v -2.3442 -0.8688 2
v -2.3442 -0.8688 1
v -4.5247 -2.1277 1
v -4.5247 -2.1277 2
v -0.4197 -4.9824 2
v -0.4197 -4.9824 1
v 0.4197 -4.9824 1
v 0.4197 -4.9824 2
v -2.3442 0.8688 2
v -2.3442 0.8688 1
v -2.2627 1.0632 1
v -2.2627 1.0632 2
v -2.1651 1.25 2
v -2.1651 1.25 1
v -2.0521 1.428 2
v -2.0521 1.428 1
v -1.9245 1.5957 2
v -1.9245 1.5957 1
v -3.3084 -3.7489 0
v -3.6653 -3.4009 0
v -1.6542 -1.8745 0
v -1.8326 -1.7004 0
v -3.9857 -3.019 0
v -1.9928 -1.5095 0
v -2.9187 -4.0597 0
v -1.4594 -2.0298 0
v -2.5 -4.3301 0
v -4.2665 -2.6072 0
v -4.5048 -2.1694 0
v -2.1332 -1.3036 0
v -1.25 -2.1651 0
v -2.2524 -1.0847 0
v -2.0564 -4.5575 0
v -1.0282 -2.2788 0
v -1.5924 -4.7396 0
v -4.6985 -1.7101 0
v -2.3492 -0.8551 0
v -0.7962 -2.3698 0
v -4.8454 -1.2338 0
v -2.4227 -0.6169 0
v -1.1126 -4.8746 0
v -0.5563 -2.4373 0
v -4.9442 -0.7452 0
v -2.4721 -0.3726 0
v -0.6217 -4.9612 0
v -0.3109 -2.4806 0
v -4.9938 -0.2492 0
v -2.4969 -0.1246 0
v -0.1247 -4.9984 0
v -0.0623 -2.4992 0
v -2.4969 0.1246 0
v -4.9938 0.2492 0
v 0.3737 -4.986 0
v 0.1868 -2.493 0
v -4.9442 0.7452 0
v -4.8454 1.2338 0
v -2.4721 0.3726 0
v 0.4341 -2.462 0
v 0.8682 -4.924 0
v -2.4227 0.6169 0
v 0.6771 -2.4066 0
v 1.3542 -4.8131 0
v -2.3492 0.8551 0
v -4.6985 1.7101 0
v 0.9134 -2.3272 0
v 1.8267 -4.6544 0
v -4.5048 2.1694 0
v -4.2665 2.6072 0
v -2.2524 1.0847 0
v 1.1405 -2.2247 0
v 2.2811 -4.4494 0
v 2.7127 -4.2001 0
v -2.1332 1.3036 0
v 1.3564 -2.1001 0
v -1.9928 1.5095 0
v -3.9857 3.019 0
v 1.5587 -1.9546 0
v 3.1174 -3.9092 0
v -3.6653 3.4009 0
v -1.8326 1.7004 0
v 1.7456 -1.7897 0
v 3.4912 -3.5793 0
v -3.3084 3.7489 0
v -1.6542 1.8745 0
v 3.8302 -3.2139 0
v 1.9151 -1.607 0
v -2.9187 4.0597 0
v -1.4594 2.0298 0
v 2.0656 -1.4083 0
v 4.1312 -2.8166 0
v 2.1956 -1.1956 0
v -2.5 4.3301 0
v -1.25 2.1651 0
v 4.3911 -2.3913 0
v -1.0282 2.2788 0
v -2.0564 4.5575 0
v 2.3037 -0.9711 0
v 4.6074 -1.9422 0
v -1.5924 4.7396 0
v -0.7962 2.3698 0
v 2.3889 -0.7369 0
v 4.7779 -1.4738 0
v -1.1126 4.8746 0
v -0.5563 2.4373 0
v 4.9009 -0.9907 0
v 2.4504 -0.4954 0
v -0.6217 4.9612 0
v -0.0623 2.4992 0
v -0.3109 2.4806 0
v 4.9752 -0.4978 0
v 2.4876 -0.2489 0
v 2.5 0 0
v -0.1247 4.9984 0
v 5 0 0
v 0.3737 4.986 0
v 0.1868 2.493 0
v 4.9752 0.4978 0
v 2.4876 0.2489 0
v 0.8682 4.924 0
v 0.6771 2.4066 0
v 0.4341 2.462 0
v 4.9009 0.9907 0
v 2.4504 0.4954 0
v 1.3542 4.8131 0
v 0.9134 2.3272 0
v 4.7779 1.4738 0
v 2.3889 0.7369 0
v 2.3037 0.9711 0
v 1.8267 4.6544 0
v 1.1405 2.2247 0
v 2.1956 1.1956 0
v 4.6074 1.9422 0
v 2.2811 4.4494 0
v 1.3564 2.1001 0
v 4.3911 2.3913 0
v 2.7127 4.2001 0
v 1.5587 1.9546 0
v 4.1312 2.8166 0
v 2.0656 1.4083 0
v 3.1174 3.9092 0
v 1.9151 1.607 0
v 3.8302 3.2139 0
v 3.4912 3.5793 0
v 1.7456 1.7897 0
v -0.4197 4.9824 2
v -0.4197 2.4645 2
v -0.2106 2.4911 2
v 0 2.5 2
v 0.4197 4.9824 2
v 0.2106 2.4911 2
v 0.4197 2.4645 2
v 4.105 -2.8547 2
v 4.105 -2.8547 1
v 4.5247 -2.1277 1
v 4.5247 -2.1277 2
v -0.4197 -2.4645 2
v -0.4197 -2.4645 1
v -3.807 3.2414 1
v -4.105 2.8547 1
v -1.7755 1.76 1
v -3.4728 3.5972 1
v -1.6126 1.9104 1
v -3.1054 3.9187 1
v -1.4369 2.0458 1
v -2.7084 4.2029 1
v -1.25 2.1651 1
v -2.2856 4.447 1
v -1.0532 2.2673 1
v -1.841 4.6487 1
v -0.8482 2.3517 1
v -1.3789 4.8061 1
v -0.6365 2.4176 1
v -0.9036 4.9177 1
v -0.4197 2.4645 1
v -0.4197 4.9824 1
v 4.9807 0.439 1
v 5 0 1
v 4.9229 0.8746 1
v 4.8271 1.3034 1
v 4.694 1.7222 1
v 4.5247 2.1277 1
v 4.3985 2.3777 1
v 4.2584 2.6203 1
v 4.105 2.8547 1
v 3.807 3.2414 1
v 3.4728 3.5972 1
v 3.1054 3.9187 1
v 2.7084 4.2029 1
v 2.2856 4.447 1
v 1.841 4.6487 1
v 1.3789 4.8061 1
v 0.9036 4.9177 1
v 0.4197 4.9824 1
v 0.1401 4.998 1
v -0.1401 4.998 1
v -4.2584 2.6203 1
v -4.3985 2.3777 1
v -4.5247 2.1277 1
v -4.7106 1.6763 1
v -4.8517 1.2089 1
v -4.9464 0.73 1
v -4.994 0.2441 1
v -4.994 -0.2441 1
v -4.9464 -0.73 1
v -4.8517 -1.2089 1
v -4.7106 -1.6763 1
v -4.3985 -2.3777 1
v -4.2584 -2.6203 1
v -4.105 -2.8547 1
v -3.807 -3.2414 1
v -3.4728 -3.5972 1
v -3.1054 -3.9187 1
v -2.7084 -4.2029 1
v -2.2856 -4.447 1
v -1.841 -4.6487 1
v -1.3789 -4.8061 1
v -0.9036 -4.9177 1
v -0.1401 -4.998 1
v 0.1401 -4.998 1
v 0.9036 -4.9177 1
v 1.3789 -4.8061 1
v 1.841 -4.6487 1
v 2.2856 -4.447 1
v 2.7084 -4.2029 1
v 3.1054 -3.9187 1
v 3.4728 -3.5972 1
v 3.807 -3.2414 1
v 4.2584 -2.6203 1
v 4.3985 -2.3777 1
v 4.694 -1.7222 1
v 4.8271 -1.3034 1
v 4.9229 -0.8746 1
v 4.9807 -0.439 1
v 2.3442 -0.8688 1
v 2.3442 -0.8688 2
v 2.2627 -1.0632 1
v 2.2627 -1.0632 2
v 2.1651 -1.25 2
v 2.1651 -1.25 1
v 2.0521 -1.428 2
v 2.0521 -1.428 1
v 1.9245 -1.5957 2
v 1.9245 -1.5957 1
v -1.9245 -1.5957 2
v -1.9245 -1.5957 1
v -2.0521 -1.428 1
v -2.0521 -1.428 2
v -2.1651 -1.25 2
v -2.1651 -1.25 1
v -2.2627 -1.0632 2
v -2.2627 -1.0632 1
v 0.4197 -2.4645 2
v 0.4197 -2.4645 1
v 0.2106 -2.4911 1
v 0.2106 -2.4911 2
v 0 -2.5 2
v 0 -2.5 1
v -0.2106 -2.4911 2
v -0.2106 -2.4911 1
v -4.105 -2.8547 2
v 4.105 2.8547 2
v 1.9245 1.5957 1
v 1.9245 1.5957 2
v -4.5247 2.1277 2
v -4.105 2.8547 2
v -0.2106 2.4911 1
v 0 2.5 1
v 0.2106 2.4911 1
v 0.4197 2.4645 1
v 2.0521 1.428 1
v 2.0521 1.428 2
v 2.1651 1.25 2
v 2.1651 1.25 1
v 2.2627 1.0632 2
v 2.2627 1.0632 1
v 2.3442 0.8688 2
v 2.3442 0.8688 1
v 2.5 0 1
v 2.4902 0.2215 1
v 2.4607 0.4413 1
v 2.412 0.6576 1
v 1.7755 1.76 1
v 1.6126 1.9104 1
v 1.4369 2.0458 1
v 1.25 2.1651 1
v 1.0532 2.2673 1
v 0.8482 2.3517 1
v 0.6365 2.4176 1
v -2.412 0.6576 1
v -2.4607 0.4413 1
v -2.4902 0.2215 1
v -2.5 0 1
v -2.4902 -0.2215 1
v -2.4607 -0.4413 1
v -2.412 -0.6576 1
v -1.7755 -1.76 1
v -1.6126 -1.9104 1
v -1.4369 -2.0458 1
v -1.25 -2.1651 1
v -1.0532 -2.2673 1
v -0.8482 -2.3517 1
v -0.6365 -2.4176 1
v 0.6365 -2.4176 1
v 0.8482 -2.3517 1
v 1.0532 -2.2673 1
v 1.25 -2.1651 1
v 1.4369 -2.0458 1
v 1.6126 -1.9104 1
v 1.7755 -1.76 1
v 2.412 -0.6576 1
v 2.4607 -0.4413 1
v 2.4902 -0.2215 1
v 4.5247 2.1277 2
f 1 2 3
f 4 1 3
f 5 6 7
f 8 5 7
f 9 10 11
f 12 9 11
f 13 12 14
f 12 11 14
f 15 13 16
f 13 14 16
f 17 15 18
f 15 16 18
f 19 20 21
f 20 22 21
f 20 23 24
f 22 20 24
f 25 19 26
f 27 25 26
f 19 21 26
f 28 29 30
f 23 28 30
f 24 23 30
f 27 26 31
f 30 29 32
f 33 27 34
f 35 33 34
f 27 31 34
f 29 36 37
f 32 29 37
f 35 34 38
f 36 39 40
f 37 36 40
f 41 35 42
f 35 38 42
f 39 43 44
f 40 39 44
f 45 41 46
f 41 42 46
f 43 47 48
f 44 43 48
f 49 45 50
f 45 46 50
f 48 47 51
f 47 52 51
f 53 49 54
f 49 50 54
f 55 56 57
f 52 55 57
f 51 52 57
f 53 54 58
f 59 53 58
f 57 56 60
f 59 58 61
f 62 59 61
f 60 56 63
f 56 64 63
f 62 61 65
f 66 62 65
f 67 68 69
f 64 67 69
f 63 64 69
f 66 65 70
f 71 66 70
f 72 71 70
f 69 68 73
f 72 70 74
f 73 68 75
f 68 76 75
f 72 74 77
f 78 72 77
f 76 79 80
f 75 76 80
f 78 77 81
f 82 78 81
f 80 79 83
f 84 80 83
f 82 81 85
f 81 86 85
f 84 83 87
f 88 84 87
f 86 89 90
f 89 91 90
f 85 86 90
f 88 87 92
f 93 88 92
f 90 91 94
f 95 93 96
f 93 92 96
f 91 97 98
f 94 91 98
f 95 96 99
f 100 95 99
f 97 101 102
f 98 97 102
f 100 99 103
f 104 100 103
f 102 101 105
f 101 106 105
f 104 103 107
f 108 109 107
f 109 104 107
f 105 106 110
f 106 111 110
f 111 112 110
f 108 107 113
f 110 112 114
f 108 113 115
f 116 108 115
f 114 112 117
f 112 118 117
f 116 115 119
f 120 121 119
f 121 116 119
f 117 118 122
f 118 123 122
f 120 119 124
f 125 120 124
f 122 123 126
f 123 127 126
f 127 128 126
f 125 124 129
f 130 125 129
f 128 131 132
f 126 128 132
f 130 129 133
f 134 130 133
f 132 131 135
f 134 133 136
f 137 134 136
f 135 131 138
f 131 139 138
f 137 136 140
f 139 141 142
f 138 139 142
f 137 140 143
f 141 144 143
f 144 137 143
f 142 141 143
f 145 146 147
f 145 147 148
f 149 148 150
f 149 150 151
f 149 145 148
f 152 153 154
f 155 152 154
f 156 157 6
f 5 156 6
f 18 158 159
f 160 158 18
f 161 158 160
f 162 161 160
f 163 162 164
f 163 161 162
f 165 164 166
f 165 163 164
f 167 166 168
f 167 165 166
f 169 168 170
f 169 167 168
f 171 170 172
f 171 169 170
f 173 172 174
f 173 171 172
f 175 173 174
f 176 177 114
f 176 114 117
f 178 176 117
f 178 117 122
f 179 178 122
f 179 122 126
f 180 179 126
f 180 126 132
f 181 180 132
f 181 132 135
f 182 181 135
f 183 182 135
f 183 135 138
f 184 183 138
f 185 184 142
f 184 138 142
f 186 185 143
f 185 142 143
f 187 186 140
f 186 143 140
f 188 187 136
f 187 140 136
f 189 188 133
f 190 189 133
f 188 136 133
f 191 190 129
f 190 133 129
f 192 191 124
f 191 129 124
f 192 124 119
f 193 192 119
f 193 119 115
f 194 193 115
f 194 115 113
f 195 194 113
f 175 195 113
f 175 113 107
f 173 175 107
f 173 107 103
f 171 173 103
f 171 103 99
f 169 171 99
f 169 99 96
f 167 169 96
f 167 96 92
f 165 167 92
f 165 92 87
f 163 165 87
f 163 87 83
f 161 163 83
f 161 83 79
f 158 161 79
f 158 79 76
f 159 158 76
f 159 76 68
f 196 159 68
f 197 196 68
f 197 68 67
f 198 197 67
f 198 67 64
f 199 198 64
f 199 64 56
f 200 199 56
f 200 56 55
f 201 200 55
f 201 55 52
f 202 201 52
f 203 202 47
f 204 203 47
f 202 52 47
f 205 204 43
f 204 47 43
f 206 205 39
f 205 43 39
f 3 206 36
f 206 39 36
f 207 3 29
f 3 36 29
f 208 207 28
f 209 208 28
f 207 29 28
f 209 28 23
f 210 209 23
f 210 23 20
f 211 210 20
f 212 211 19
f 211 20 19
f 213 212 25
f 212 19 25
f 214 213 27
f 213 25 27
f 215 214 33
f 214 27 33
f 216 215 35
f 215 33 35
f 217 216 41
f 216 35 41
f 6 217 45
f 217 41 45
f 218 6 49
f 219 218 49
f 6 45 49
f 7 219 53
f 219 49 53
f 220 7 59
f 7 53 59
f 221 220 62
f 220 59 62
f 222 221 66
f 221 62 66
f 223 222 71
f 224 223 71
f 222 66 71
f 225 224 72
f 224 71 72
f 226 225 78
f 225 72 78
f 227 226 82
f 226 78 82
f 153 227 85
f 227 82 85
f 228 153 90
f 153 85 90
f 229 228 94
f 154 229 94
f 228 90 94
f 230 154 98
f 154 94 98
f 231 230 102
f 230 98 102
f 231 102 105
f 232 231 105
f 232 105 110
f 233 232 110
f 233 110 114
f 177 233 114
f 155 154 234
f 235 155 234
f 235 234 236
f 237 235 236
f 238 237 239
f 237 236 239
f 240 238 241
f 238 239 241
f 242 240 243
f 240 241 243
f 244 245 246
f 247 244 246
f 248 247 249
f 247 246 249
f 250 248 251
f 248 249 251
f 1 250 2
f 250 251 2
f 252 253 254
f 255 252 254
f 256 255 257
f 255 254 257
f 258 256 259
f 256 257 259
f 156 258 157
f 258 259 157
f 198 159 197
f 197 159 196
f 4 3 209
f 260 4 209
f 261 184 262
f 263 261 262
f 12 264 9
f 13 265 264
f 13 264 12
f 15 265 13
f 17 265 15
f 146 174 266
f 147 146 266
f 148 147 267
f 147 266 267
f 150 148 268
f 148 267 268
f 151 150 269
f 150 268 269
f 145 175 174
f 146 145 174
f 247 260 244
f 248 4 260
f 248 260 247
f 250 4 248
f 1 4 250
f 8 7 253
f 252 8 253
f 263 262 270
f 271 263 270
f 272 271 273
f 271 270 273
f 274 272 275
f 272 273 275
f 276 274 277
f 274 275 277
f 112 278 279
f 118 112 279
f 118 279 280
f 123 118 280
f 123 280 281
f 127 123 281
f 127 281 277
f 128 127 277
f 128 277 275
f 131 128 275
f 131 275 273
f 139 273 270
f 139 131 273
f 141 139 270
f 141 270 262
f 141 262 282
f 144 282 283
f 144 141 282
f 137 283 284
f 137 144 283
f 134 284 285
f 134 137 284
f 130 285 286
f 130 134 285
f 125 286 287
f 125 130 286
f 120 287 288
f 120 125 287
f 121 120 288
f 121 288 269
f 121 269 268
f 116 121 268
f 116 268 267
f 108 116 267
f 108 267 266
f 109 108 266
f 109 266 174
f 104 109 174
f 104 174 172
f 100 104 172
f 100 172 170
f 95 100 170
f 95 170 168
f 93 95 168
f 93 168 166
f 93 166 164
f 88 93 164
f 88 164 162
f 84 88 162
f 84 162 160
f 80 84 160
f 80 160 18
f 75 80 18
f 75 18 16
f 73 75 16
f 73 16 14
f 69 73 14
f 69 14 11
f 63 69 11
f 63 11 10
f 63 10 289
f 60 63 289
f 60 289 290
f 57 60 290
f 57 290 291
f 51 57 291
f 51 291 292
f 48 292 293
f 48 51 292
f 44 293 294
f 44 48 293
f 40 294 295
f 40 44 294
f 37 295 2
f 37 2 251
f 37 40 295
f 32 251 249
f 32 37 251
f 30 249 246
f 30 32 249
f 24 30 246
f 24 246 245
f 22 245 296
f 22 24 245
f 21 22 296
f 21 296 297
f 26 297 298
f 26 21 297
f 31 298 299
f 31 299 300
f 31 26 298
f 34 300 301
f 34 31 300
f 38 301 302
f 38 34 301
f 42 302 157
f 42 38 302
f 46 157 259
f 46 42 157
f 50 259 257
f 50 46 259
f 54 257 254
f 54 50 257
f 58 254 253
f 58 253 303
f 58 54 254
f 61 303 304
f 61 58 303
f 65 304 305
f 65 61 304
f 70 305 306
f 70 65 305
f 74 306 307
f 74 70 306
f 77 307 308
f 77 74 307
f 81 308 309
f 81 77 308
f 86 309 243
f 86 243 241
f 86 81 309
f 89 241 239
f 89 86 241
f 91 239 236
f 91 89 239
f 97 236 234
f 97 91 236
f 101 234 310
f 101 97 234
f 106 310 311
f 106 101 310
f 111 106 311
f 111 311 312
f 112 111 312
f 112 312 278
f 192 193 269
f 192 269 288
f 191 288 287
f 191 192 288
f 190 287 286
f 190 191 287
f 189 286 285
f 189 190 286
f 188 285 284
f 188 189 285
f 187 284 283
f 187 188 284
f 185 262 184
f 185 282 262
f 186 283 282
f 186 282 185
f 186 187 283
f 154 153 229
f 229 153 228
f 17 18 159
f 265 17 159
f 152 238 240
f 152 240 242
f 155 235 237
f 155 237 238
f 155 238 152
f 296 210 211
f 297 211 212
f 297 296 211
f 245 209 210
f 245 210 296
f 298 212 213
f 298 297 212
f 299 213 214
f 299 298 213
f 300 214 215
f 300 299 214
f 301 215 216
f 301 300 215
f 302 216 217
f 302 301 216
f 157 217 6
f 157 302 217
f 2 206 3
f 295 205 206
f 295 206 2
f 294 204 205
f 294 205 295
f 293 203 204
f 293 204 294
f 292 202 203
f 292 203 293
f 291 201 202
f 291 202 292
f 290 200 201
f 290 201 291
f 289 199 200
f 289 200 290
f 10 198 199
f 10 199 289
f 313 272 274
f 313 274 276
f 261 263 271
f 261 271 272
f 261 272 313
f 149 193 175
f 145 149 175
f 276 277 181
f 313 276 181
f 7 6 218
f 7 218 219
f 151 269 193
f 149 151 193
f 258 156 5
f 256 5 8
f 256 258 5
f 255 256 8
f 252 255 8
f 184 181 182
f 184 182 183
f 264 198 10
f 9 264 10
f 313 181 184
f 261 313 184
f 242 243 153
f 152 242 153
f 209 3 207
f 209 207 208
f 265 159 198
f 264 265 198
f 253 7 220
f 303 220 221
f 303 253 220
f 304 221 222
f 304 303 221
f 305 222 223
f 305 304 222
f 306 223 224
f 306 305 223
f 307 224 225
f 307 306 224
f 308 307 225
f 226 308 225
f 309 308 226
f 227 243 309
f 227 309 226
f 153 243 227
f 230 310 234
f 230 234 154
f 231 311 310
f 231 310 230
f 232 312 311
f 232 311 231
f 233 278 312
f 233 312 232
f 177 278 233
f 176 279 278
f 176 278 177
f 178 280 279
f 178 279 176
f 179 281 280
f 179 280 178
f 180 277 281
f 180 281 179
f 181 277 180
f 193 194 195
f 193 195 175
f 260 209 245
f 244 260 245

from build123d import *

# Parameters (mm, degrees)
F0_R     = 5
F0_R_2   = 2.5
F1_DEPTH = 1
F3_DEPTH = 1


# Not quite as in the source:
# - after a boolean that leaves OpenCascade's solid faulty, fix() repairs it


with BuildPart() as f1:
    # F0 (on Top) → F1 (new body)
    with BuildSketch(Plane.XY):
        Circle(F0_R)
        Circle(F0_R_2, mode=Mode.SUBTRACT)
    extrude(amount=F1_DEPTH)

    # F2 (on face) → F3 (join)
    with BuildSketch(Plane.XY.offset(1)):
        with BuildLine():
            ThreePointArc((-0.4197226159, 2.4645147445), (0, 2.5), (0.4197226159, 2.4645147445))
            Line((0.4197226159, 2.4645147445), (0.4197226159, 4.9823521479))
            Line((0.4197226159, 4.9823521479), (-0.4197226159, 4.9823521479))
            Line((-0.4197226159, 4.9823521479), (-0.4197226159, 2.4645147445))
        make_face()
        with BuildLine():
            ThreePointArc((-2.3441936847, 0.8687669243), (-2.1650635095, 1.25), (-1.9244710687, 1.5957478202))
            Line((-1.9244710687, 1.5957478202), (-4.1049822227, 2.8546665219))
            Line((-4.1049822227, 2.8546665219), (-4.5247048387, 2.127685626))
            Line((-4.5247048387, 2.127685626), (-2.3441936847, 0.8687669243))
        make_face()
        with BuildLine():
            ThreePointArc((-1.9244710687, -1.5957478202), (-2.1650635095, -1.25), (-2.3441936847, -0.8687669243))
            Line((-2.3441936847, -0.8687669243), (-4.5247048387, -2.127685626))
            Line((-4.5247048387, -2.127685626), (-4.1049822227, -2.8546665219))
            Line((-4.1049822227, -2.8546665219), (-1.9244710687, -1.5957478202))
        make_face()
        with BuildLine():
            ThreePointArc((0.4197226159, -2.4645147445), (0, -2.5), (-0.4197226159, -2.4645147445))
            Line((-0.4197226159, -2.4645147445), (-0.4197226159, -4.9823521479))
            Line((-0.4197226159, -4.9823521479), (0.4197226159, -4.9823521479))
            Line((0.4197226159, -4.9823521479), (0.4197226159, -2.4645147445))
        make_face()
        with BuildLine():
            Line((4.5247048387, -2.127685626), (2.3441936847, -0.8687669243))
            ThreePointArc((2.3441936847, -0.8687669243), (2.1650635095, -1.25), (1.9244710687, -1.5957478202))
            Line((1.9244710687, -1.5957478202), (4.1049822227, -2.8546665219))
            Line((4.1049822227, -2.8546665219), (4.5247048387, -2.127685626))
        make_face()
        with BuildLine():
            Line((4.1049822227, 2.8546665219), (1.9244710687, 1.5957478202))
            ThreePointArc((1.9244710687, 1.5957478202), (2.1650635095, 1.25), (2.3441936847, 0.8687669243))
            Line((2.3441936847, 0.8687669243), (4.5247048387, 2.127685626))
            Line((4.5247048387, 2.127685626), (4.1049822227, 2.8546665219))
        make_face()
    extrude(amount=F3_DEPTH)

    add(f1.part.fix(), mode=Mode.REPLACE)


solid = f1.part
